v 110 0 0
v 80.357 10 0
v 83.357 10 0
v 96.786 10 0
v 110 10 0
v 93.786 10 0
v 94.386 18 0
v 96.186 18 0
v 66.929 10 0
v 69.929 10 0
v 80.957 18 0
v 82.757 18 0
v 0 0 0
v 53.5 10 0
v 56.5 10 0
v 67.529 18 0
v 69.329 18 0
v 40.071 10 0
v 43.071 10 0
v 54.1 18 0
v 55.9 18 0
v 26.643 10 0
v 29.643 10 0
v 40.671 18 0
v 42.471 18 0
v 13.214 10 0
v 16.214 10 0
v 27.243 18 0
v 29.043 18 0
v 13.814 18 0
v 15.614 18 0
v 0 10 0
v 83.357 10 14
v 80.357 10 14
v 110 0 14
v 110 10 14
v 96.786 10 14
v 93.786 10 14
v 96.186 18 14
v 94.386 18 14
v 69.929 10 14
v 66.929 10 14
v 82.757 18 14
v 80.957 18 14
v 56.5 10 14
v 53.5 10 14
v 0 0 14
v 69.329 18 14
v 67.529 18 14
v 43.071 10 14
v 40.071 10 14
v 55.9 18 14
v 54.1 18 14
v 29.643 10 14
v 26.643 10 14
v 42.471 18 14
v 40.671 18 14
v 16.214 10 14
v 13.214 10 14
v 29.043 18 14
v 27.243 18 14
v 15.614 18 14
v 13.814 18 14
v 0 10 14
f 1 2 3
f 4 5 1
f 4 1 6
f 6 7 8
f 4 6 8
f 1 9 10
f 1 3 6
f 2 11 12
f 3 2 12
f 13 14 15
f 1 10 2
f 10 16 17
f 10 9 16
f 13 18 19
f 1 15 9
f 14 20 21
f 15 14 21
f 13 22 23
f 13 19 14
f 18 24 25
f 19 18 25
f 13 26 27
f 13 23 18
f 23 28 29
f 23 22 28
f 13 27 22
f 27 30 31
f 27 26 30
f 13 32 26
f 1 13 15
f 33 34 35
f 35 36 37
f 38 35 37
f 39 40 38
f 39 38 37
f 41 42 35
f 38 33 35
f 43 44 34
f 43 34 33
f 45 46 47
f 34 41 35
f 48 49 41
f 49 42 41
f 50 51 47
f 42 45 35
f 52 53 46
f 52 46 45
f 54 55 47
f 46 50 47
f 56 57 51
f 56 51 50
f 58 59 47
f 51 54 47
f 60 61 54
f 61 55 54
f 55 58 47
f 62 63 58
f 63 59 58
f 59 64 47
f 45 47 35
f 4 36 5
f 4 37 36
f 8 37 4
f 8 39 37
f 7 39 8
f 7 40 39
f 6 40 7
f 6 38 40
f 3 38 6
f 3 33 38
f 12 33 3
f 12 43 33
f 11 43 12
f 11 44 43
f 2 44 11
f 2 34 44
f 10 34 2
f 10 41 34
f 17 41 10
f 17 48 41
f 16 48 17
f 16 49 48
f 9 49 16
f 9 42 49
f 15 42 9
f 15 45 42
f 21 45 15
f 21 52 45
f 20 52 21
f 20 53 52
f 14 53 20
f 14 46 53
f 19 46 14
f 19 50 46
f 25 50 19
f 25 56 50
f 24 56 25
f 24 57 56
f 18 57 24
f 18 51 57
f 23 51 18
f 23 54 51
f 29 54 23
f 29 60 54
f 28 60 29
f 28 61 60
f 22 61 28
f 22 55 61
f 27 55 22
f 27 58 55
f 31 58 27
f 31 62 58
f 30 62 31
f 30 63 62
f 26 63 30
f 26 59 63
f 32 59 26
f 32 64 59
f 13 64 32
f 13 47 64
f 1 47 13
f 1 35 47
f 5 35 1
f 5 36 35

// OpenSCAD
$fn = 32;

// ----------------------------------------------------------------------
// Gear rack: 7 teeth on a 110 mm bar, pitch 13.43 mm
// ----------------------------------------------------------------------

// --- parameters (mm) ---
profile_height = 14;      // extrusion height
profile_points = 32;      // points of the closed outline

profile = [[0, 0], [110, 0], [110, 10], [96.786, 10], [96.186, 18], [94.386, 18], [93.786, 10], [83.357, 10], [82.757, 18], [80.957, 18], [80.357, 10], [69.929, 10], [69.329, 18], [67.529, 18], [66.929, 10], [56.5, 10], [55.9, 18], [54.1, 18], [53.5, 10], [43.071, 10], [42.471, 18], [40.671, 18], [40.071, 10], [29.643, 10], [29.043, 18], [27.243, 18], [26.643, 10], [16.214, 10], [15.614, 18], [13.814, 18], [13.214, 10], [0, 10]];  // single closed polygon, 32 points, counter clockwise

// --- the one profile operation ---
linear_extrude(height = profile_height) polygon(points = profile);
